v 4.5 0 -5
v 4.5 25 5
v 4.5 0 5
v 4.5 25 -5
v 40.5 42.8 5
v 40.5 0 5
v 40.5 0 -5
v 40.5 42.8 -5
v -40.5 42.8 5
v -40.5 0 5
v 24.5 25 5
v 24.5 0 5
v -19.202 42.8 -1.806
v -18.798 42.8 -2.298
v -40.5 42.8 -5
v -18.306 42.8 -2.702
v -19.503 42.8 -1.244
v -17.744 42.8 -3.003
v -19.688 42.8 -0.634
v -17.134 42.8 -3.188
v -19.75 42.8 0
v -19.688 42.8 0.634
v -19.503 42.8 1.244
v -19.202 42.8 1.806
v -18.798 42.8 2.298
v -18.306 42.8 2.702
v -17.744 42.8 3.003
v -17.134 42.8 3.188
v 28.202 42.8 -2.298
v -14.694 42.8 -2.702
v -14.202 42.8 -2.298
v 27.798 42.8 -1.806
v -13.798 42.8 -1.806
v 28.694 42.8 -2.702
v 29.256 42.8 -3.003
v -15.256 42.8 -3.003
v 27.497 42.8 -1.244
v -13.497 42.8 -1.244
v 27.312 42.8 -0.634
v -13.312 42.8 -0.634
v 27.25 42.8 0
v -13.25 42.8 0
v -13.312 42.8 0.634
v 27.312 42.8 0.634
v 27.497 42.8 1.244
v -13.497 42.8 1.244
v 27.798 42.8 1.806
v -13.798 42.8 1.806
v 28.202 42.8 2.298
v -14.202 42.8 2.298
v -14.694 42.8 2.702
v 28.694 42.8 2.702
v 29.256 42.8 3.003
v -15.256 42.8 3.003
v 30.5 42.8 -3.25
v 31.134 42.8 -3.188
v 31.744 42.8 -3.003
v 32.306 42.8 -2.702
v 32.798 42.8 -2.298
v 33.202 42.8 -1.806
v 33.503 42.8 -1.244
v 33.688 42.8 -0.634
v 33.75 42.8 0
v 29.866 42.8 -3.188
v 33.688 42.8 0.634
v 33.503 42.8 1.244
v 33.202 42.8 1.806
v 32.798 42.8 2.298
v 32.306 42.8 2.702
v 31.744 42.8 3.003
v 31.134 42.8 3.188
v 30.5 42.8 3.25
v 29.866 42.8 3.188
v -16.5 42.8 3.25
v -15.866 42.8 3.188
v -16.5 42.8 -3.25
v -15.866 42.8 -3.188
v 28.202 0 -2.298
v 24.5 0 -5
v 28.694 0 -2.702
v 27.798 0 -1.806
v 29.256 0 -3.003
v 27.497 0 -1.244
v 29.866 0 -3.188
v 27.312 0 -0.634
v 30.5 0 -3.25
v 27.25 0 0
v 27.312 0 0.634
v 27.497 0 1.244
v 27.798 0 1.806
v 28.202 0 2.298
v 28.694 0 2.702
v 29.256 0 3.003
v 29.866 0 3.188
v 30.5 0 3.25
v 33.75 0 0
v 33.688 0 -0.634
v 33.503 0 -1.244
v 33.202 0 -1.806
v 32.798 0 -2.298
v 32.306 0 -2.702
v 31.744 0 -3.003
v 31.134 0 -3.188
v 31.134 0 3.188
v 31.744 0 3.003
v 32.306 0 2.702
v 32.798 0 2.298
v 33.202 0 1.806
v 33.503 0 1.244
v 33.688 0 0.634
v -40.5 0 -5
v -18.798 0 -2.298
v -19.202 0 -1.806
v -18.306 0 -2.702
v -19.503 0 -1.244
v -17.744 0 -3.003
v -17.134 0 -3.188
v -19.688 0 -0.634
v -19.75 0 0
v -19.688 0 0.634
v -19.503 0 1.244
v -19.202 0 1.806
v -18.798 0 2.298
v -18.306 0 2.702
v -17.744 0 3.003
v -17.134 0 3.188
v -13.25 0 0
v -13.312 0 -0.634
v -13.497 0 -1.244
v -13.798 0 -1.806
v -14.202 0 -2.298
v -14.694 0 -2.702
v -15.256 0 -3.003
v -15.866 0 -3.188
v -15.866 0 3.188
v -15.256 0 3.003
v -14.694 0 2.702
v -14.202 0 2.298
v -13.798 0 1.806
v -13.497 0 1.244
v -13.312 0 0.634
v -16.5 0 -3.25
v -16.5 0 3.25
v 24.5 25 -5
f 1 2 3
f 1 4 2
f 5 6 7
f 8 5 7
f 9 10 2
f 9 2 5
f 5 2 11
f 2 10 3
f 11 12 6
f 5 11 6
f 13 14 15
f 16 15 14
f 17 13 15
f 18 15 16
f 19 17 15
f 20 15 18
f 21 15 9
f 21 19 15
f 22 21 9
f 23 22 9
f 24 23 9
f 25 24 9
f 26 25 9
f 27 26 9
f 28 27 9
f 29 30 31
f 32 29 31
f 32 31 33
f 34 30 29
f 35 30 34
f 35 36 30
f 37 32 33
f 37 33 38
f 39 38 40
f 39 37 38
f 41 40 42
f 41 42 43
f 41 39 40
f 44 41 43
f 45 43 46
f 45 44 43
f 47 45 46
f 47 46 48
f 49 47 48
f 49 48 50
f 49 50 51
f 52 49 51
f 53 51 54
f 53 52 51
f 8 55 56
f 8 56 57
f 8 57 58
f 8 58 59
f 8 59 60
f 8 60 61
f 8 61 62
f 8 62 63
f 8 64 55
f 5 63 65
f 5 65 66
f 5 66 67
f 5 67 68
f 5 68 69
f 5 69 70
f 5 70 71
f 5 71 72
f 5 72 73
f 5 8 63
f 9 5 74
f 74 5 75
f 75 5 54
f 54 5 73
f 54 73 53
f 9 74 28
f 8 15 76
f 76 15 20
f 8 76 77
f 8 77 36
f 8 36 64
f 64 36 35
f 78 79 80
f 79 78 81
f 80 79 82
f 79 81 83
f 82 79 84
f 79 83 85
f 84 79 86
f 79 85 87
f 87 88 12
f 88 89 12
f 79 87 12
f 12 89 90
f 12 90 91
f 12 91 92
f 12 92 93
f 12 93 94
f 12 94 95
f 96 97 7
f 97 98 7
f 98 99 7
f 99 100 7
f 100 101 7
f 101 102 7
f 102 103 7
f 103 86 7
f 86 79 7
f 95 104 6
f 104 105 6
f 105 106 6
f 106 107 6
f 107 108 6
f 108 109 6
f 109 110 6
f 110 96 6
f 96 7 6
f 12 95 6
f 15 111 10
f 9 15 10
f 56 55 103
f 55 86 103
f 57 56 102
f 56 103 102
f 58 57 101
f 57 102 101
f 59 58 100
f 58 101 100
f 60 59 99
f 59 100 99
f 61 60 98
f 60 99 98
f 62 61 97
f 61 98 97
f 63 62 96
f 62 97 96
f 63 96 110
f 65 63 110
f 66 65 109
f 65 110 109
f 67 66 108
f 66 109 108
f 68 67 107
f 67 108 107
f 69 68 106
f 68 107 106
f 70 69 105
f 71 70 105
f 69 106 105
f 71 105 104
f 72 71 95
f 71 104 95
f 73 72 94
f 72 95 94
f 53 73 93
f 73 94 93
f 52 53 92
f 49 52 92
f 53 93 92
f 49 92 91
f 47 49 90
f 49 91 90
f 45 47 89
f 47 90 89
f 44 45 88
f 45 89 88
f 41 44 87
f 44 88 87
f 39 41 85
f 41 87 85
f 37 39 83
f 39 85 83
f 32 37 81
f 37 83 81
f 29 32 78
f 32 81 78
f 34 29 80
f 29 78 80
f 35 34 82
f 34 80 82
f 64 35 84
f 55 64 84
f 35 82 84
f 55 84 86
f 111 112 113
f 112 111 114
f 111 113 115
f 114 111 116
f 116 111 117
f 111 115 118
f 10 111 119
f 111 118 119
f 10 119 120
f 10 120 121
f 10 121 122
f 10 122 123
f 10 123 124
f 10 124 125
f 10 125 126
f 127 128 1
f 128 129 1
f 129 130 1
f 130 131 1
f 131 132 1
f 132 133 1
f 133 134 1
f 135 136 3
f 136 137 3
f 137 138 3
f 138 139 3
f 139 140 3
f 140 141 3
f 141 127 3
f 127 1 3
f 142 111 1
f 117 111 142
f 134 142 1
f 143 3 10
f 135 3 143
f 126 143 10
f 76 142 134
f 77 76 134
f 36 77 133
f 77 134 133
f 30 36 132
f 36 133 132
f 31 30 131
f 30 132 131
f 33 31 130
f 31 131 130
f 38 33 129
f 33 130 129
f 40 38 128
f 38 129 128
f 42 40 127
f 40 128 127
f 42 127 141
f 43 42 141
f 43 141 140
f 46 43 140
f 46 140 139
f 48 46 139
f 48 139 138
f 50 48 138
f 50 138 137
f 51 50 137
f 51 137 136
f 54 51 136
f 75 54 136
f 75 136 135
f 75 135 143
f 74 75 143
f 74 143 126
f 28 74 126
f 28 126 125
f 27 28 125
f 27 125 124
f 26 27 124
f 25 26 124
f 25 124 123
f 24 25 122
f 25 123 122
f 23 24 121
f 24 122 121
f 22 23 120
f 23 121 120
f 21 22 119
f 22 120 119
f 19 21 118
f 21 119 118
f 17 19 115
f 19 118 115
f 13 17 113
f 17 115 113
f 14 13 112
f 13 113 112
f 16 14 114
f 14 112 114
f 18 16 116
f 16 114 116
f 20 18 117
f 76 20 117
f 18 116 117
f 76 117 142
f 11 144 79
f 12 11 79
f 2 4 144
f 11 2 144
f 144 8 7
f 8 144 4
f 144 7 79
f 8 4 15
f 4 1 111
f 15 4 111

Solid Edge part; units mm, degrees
sketch "Sketch1" plane through (0, 0, 0) normal (0, -1, 0) x (1, 0, 0)
  line L0 (40.5, -5) -> (-40.5, -5)
  line L1 (-40.5, -5) -> (-40.5, 5)
  line L2 (-40.5, 5) -> (40.5, 5)
  line L3 (40.5, 5) -> (40.5, -5)
  dimension "D1" = 81
  dimension "D2" = 10
extrude "Protrusion1" add sketch "Sketch1" against normal blind 42.8
hole "Agujero_1" at (-16.5, 0, 0) direction (0, 1, 0) diameter 6.5 end through all
hole "Hole1" at (30.5, 0, 0) direction (0, 1, 0) diameter 6.5 end through all
sketch "Sketch2" plane through (0, 21.4, -5) normal (0, 0, -1) x (1, 0, 0)
  line L0 (24.5, -3.6) -> (24.5, 21.4)
  line L1 (4.5, -3.6) -> (24.5, -3.6)
  line L2 (4.5, -3.6) -> (4.5, 21.4)
  dimension "D1" = 20
  dimension "D2" = 25
  dimension "D3" = 16
extrude "Cutout1" cut sketch "Sketch2" against normal through all material side at (24.45, 12.5, -5)
properties part number "1976-1100-016" material "Aluminio, 7075-T6"
